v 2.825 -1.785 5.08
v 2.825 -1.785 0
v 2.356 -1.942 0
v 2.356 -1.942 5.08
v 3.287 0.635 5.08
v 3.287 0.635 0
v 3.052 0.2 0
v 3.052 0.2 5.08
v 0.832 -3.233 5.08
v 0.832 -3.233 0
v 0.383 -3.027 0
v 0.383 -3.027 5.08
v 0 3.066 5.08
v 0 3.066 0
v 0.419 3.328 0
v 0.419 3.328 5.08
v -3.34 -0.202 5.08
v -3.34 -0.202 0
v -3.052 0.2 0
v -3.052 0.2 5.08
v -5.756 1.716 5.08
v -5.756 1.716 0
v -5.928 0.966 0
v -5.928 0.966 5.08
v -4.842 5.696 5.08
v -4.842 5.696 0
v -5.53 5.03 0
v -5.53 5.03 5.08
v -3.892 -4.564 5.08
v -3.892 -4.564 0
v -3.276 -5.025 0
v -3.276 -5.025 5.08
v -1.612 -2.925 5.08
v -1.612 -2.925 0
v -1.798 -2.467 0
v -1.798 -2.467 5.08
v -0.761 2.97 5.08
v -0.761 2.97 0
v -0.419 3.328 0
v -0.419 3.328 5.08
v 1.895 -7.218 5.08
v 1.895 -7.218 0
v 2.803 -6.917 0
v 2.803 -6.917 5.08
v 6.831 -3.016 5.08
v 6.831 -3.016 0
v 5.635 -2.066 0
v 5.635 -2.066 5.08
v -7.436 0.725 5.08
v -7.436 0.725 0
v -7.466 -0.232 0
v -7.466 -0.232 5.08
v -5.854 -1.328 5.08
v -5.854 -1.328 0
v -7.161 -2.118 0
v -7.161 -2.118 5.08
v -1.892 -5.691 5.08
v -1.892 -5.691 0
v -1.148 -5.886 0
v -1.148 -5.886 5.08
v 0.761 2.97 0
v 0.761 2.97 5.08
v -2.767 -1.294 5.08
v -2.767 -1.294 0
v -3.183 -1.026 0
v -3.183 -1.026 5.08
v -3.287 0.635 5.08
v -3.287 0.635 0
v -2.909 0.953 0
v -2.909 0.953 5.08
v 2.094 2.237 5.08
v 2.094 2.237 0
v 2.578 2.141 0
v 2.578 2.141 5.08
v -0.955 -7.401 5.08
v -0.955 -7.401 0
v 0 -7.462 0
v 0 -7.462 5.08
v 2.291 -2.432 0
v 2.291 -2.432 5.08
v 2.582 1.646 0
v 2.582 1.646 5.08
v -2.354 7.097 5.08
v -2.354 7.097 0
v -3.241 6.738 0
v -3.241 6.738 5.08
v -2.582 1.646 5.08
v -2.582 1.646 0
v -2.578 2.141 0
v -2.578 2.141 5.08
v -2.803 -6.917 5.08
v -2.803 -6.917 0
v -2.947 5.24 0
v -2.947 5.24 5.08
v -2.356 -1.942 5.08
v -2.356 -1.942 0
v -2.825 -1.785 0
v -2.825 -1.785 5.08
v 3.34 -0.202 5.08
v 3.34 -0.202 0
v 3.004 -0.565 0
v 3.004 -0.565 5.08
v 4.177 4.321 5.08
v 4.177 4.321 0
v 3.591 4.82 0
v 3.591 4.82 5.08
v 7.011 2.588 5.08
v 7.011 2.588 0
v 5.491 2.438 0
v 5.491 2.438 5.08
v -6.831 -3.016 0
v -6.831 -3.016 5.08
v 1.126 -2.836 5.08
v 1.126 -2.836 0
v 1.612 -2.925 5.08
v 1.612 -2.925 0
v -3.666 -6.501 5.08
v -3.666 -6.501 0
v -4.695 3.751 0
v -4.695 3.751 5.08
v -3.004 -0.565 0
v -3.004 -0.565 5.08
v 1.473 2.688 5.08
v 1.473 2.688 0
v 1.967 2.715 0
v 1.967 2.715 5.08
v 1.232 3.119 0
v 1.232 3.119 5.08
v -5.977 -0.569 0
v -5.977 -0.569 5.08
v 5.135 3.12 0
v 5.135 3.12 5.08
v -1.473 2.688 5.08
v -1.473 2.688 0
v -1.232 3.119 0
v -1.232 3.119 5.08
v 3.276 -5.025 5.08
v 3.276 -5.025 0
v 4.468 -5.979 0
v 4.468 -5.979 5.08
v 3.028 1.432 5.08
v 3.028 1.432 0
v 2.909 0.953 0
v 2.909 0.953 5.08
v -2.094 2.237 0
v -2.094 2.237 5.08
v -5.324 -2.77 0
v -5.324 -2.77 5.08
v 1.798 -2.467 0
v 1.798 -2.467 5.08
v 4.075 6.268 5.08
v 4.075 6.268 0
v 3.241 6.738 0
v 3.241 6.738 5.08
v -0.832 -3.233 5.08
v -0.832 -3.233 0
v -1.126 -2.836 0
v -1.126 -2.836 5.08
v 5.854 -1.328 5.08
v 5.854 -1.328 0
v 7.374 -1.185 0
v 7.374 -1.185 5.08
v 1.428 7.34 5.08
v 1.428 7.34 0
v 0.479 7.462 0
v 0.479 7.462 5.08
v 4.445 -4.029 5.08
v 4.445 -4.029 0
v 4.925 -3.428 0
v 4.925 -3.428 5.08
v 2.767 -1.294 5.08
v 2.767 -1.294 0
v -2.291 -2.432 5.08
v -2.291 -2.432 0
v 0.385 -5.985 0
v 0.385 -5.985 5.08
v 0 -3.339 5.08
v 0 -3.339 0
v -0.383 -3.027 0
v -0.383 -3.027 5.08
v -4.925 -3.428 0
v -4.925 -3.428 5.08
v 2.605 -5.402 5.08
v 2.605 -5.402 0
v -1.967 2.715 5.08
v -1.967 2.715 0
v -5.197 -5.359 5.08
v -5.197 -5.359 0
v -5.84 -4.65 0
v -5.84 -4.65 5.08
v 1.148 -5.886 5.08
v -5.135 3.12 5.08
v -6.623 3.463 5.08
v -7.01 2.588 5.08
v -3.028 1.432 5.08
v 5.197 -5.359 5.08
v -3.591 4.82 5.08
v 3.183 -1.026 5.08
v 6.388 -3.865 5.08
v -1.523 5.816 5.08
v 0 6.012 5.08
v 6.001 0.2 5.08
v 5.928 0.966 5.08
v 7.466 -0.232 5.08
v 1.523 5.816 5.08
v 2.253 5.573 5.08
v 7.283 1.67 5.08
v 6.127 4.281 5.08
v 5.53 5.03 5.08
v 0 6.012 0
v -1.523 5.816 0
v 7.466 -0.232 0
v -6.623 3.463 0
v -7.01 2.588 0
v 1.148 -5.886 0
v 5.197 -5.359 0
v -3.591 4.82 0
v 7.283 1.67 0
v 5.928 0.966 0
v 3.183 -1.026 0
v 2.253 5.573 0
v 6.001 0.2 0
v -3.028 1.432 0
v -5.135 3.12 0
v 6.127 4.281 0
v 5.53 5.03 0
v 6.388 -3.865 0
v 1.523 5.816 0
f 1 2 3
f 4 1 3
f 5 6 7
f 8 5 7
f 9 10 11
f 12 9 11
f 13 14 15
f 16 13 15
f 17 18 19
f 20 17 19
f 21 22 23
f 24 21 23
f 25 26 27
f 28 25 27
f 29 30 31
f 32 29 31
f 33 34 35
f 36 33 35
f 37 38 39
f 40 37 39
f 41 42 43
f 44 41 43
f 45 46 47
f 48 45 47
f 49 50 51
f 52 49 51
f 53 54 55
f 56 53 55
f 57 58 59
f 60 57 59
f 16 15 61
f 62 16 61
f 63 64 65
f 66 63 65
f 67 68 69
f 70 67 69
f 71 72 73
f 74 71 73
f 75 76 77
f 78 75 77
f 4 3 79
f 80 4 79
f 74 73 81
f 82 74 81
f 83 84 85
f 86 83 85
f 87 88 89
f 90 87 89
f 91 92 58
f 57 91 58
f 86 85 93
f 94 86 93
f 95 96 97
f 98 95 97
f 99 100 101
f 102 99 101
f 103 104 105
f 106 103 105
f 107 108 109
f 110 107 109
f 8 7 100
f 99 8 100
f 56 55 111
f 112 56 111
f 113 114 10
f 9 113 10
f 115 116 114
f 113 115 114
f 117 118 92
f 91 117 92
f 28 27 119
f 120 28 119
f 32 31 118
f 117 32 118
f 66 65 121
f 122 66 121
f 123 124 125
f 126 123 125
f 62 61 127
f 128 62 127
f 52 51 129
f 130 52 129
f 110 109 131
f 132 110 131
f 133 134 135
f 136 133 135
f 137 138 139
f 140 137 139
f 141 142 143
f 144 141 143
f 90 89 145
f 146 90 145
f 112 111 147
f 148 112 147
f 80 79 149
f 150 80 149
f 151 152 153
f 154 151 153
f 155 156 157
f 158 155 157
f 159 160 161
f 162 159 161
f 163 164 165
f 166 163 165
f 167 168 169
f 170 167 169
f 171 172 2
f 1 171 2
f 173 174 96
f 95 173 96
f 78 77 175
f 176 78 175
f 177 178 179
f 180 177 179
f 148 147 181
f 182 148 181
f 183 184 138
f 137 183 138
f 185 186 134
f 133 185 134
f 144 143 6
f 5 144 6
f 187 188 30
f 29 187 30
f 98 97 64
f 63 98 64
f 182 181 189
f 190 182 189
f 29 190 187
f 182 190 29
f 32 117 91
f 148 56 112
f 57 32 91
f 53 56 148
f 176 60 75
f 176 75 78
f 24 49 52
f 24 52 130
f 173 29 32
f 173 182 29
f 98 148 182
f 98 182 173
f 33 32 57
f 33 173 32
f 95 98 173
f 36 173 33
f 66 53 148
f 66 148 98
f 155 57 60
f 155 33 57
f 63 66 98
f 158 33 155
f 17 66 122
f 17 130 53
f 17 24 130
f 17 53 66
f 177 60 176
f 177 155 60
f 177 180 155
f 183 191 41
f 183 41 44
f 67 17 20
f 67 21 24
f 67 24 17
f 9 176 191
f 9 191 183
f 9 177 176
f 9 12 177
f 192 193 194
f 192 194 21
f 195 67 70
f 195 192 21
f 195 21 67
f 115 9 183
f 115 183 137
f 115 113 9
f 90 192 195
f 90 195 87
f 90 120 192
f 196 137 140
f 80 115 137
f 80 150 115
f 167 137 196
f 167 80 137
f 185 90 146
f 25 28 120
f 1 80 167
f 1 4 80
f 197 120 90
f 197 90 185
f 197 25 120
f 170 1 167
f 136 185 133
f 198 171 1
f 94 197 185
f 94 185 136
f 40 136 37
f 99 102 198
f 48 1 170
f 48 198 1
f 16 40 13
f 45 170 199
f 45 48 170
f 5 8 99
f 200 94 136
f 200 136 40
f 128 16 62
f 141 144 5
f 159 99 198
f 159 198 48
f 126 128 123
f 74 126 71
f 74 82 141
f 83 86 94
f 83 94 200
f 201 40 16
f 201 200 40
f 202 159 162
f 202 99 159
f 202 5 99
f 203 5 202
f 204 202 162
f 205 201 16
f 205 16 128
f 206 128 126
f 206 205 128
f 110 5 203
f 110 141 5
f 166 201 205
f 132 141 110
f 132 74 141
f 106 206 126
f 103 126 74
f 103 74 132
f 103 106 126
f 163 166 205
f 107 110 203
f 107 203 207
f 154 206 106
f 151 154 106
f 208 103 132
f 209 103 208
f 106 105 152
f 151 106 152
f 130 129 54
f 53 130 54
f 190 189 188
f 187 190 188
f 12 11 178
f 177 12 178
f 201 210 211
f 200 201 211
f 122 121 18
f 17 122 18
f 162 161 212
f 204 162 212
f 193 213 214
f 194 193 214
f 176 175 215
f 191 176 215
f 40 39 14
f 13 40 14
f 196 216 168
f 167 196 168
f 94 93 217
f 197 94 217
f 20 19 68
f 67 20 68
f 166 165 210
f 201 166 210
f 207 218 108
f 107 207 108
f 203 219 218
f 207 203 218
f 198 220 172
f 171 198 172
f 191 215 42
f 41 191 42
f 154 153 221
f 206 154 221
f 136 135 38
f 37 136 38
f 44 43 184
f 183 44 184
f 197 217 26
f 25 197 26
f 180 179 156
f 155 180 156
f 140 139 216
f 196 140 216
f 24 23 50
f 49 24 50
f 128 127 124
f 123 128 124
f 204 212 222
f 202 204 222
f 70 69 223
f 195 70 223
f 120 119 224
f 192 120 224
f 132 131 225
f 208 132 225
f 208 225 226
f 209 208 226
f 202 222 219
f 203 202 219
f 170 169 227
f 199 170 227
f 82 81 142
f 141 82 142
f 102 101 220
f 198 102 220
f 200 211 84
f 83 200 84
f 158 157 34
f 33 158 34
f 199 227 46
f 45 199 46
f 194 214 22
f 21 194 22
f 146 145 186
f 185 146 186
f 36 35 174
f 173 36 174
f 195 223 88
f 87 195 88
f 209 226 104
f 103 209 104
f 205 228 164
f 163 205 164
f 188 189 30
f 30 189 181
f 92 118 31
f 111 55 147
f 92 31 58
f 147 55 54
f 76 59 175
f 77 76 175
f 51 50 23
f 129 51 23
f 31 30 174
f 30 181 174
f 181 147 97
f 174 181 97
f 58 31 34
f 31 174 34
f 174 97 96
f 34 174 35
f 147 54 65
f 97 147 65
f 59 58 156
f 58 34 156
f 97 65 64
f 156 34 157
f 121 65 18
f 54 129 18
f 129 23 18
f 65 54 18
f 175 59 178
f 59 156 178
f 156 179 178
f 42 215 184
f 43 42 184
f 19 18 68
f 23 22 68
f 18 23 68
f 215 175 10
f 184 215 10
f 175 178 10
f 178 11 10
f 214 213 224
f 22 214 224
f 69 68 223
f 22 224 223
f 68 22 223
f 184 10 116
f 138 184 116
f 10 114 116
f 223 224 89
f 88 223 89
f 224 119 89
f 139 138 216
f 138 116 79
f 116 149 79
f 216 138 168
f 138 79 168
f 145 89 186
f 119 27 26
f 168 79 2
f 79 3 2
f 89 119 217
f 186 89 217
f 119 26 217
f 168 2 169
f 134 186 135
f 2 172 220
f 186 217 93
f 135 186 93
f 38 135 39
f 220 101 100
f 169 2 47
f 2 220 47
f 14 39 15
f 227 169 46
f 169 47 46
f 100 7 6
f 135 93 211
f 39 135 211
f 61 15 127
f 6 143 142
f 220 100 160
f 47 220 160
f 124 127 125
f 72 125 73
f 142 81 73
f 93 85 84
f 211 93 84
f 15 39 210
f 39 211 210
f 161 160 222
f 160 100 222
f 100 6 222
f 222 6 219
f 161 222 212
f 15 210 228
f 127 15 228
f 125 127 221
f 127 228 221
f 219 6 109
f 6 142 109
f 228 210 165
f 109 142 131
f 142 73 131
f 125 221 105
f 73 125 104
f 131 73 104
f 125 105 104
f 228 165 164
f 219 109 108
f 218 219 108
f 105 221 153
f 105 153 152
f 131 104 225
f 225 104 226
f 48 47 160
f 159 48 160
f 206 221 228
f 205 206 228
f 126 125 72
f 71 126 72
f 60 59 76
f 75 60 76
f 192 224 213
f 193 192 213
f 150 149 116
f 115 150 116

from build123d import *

# Parameters (mm, degrees)
F1_DEPTH = 5.08


with BuildPart() as f1:
    # F0 (on Top) → F1 (new body)
    with BuildSketch(Plane.XY):
        Polygon((0.478612, 7.462469), (0, 6.012231), (-1.523086, 5.815863), (-2.353894, 7.097243), (-3.241167, 6.738036), (-2.946527, 5.239563), (-3.591382, 4.819802), (-4.842358, 5.695772), (-5.529986, 5.02986), (-4.694555, 3.751453), (-5.134762, 3.12039), (-6.623025, 3.462909), (-7.010476, 2.5876), (-5.756377, 1.716126), (-5.927598, 0.965987), (-7.435621, 0.724967), (-7.466305, -0.23175), (-5.976798, -0.568909), (-5.854014, -1.328471), (-7.161378, -2.117801), (-6.830797, -3.016123), (-5.323637, -2.769667), (-4.924781, -3.427628), (-5.840374, -4.649876), (-5.19684, -5.358511), (-3.892321, -4.564482), (-3.275686, -5.024679), (-3.665728, -6.501206), (-2.803296, -6.916522), (-1.892071, -5.690997), (-1.147826, -5.886171), (-0.955243, -7.401128), (0, -7.462469), (0.384708, -5.984545), (1.147826, -5.886171), (1.89484, -7.218147), (2.803296, -6.916522), (2.605278, -5.40225), (3.275711, -5.024679), (4.467987, -5.979008), (5.19684, -5.358511), (4.445051, -4.029202), (4.924781, -3.427628), (6.388049, -3.864788), (6.830797, -3.016123), (5.635092, -2.066087), (5.854014, -1.328471), (7.374382, -1.184554), (7.466305, -0.23175), (6.001487, 0.200127), (5.927598, 0.965987), (7.282866, 1.669923), (7.010502, 2.5876), (5.490642, 2.438222), (5.134762, 3.12039), (6.12681, 4.281475), (5.529986, 5.02986), (4.177284, 4.321048), (3.591408, 4.819802), (4.075227, 6.268314), (3.241167, 6.738036), (2.25331, 5.573395), (1.523086, 5.815863), (1.427988, 7.340067), align=None)
        Polygon((-1.231849, 3.118993), (-0.760552, 2.969895), (-0.419405, 3.327578), (0, 3.065983), (0.419405, 3.327578), (0.760578, 2.969895), (1.231849, 3.118993), (1.473352, 2.687676), (1.9669, 2.714879), (2.093544, 2.23708), (2.578379, 2.140687), (2.582215, 1.646403), (3.027832, 1.432458), (2.90863, 0.952729), (3.287039, 0.634695), (3.052267, 0.199695), (3.339694, -0.202438), (3.004134, -0.565404), (3.182518, -1.026389), (2.767228, -1.294486), (2.825369, -1.785366), (2.35646, -1.941754), (2.290699, -2.431669), (1.797634, -2.466543), (1.612087, -2.924708), (1.12583, -2.835859), (0.832206, -3.233496), (0.383311, -3.026512), (0, -3.338627), (-0.383311, -3.026512), (-0.83218, -3.233496), (-1.12583, -2.835859), (-1.612087, -2.924708), (-1.797609, -2.466543), (-2.290699, -2.431669), (-2.35646, -1.941754), (-2.825369, -1.785366), (-2.767228, -1.294486), (-3.182518, -1.026389), (-3.004134, -0.565404), (-3.339694, -0.202438), (-3.052267, 0.199695), (-3.287014, 0.634695), (-2.908605, 0.952729), (-3.027807, 1.432458), (-2.582215, 1.646403), (-2.578354, 2.140687), (-2.093544, 2.23708), (-1.9669, 2.714879), (-1.473352, 2.687676), align=None, mode=Mode.SUBTRACT)
    extrude(amount=F1_DEPTH)


solid = f1.part
